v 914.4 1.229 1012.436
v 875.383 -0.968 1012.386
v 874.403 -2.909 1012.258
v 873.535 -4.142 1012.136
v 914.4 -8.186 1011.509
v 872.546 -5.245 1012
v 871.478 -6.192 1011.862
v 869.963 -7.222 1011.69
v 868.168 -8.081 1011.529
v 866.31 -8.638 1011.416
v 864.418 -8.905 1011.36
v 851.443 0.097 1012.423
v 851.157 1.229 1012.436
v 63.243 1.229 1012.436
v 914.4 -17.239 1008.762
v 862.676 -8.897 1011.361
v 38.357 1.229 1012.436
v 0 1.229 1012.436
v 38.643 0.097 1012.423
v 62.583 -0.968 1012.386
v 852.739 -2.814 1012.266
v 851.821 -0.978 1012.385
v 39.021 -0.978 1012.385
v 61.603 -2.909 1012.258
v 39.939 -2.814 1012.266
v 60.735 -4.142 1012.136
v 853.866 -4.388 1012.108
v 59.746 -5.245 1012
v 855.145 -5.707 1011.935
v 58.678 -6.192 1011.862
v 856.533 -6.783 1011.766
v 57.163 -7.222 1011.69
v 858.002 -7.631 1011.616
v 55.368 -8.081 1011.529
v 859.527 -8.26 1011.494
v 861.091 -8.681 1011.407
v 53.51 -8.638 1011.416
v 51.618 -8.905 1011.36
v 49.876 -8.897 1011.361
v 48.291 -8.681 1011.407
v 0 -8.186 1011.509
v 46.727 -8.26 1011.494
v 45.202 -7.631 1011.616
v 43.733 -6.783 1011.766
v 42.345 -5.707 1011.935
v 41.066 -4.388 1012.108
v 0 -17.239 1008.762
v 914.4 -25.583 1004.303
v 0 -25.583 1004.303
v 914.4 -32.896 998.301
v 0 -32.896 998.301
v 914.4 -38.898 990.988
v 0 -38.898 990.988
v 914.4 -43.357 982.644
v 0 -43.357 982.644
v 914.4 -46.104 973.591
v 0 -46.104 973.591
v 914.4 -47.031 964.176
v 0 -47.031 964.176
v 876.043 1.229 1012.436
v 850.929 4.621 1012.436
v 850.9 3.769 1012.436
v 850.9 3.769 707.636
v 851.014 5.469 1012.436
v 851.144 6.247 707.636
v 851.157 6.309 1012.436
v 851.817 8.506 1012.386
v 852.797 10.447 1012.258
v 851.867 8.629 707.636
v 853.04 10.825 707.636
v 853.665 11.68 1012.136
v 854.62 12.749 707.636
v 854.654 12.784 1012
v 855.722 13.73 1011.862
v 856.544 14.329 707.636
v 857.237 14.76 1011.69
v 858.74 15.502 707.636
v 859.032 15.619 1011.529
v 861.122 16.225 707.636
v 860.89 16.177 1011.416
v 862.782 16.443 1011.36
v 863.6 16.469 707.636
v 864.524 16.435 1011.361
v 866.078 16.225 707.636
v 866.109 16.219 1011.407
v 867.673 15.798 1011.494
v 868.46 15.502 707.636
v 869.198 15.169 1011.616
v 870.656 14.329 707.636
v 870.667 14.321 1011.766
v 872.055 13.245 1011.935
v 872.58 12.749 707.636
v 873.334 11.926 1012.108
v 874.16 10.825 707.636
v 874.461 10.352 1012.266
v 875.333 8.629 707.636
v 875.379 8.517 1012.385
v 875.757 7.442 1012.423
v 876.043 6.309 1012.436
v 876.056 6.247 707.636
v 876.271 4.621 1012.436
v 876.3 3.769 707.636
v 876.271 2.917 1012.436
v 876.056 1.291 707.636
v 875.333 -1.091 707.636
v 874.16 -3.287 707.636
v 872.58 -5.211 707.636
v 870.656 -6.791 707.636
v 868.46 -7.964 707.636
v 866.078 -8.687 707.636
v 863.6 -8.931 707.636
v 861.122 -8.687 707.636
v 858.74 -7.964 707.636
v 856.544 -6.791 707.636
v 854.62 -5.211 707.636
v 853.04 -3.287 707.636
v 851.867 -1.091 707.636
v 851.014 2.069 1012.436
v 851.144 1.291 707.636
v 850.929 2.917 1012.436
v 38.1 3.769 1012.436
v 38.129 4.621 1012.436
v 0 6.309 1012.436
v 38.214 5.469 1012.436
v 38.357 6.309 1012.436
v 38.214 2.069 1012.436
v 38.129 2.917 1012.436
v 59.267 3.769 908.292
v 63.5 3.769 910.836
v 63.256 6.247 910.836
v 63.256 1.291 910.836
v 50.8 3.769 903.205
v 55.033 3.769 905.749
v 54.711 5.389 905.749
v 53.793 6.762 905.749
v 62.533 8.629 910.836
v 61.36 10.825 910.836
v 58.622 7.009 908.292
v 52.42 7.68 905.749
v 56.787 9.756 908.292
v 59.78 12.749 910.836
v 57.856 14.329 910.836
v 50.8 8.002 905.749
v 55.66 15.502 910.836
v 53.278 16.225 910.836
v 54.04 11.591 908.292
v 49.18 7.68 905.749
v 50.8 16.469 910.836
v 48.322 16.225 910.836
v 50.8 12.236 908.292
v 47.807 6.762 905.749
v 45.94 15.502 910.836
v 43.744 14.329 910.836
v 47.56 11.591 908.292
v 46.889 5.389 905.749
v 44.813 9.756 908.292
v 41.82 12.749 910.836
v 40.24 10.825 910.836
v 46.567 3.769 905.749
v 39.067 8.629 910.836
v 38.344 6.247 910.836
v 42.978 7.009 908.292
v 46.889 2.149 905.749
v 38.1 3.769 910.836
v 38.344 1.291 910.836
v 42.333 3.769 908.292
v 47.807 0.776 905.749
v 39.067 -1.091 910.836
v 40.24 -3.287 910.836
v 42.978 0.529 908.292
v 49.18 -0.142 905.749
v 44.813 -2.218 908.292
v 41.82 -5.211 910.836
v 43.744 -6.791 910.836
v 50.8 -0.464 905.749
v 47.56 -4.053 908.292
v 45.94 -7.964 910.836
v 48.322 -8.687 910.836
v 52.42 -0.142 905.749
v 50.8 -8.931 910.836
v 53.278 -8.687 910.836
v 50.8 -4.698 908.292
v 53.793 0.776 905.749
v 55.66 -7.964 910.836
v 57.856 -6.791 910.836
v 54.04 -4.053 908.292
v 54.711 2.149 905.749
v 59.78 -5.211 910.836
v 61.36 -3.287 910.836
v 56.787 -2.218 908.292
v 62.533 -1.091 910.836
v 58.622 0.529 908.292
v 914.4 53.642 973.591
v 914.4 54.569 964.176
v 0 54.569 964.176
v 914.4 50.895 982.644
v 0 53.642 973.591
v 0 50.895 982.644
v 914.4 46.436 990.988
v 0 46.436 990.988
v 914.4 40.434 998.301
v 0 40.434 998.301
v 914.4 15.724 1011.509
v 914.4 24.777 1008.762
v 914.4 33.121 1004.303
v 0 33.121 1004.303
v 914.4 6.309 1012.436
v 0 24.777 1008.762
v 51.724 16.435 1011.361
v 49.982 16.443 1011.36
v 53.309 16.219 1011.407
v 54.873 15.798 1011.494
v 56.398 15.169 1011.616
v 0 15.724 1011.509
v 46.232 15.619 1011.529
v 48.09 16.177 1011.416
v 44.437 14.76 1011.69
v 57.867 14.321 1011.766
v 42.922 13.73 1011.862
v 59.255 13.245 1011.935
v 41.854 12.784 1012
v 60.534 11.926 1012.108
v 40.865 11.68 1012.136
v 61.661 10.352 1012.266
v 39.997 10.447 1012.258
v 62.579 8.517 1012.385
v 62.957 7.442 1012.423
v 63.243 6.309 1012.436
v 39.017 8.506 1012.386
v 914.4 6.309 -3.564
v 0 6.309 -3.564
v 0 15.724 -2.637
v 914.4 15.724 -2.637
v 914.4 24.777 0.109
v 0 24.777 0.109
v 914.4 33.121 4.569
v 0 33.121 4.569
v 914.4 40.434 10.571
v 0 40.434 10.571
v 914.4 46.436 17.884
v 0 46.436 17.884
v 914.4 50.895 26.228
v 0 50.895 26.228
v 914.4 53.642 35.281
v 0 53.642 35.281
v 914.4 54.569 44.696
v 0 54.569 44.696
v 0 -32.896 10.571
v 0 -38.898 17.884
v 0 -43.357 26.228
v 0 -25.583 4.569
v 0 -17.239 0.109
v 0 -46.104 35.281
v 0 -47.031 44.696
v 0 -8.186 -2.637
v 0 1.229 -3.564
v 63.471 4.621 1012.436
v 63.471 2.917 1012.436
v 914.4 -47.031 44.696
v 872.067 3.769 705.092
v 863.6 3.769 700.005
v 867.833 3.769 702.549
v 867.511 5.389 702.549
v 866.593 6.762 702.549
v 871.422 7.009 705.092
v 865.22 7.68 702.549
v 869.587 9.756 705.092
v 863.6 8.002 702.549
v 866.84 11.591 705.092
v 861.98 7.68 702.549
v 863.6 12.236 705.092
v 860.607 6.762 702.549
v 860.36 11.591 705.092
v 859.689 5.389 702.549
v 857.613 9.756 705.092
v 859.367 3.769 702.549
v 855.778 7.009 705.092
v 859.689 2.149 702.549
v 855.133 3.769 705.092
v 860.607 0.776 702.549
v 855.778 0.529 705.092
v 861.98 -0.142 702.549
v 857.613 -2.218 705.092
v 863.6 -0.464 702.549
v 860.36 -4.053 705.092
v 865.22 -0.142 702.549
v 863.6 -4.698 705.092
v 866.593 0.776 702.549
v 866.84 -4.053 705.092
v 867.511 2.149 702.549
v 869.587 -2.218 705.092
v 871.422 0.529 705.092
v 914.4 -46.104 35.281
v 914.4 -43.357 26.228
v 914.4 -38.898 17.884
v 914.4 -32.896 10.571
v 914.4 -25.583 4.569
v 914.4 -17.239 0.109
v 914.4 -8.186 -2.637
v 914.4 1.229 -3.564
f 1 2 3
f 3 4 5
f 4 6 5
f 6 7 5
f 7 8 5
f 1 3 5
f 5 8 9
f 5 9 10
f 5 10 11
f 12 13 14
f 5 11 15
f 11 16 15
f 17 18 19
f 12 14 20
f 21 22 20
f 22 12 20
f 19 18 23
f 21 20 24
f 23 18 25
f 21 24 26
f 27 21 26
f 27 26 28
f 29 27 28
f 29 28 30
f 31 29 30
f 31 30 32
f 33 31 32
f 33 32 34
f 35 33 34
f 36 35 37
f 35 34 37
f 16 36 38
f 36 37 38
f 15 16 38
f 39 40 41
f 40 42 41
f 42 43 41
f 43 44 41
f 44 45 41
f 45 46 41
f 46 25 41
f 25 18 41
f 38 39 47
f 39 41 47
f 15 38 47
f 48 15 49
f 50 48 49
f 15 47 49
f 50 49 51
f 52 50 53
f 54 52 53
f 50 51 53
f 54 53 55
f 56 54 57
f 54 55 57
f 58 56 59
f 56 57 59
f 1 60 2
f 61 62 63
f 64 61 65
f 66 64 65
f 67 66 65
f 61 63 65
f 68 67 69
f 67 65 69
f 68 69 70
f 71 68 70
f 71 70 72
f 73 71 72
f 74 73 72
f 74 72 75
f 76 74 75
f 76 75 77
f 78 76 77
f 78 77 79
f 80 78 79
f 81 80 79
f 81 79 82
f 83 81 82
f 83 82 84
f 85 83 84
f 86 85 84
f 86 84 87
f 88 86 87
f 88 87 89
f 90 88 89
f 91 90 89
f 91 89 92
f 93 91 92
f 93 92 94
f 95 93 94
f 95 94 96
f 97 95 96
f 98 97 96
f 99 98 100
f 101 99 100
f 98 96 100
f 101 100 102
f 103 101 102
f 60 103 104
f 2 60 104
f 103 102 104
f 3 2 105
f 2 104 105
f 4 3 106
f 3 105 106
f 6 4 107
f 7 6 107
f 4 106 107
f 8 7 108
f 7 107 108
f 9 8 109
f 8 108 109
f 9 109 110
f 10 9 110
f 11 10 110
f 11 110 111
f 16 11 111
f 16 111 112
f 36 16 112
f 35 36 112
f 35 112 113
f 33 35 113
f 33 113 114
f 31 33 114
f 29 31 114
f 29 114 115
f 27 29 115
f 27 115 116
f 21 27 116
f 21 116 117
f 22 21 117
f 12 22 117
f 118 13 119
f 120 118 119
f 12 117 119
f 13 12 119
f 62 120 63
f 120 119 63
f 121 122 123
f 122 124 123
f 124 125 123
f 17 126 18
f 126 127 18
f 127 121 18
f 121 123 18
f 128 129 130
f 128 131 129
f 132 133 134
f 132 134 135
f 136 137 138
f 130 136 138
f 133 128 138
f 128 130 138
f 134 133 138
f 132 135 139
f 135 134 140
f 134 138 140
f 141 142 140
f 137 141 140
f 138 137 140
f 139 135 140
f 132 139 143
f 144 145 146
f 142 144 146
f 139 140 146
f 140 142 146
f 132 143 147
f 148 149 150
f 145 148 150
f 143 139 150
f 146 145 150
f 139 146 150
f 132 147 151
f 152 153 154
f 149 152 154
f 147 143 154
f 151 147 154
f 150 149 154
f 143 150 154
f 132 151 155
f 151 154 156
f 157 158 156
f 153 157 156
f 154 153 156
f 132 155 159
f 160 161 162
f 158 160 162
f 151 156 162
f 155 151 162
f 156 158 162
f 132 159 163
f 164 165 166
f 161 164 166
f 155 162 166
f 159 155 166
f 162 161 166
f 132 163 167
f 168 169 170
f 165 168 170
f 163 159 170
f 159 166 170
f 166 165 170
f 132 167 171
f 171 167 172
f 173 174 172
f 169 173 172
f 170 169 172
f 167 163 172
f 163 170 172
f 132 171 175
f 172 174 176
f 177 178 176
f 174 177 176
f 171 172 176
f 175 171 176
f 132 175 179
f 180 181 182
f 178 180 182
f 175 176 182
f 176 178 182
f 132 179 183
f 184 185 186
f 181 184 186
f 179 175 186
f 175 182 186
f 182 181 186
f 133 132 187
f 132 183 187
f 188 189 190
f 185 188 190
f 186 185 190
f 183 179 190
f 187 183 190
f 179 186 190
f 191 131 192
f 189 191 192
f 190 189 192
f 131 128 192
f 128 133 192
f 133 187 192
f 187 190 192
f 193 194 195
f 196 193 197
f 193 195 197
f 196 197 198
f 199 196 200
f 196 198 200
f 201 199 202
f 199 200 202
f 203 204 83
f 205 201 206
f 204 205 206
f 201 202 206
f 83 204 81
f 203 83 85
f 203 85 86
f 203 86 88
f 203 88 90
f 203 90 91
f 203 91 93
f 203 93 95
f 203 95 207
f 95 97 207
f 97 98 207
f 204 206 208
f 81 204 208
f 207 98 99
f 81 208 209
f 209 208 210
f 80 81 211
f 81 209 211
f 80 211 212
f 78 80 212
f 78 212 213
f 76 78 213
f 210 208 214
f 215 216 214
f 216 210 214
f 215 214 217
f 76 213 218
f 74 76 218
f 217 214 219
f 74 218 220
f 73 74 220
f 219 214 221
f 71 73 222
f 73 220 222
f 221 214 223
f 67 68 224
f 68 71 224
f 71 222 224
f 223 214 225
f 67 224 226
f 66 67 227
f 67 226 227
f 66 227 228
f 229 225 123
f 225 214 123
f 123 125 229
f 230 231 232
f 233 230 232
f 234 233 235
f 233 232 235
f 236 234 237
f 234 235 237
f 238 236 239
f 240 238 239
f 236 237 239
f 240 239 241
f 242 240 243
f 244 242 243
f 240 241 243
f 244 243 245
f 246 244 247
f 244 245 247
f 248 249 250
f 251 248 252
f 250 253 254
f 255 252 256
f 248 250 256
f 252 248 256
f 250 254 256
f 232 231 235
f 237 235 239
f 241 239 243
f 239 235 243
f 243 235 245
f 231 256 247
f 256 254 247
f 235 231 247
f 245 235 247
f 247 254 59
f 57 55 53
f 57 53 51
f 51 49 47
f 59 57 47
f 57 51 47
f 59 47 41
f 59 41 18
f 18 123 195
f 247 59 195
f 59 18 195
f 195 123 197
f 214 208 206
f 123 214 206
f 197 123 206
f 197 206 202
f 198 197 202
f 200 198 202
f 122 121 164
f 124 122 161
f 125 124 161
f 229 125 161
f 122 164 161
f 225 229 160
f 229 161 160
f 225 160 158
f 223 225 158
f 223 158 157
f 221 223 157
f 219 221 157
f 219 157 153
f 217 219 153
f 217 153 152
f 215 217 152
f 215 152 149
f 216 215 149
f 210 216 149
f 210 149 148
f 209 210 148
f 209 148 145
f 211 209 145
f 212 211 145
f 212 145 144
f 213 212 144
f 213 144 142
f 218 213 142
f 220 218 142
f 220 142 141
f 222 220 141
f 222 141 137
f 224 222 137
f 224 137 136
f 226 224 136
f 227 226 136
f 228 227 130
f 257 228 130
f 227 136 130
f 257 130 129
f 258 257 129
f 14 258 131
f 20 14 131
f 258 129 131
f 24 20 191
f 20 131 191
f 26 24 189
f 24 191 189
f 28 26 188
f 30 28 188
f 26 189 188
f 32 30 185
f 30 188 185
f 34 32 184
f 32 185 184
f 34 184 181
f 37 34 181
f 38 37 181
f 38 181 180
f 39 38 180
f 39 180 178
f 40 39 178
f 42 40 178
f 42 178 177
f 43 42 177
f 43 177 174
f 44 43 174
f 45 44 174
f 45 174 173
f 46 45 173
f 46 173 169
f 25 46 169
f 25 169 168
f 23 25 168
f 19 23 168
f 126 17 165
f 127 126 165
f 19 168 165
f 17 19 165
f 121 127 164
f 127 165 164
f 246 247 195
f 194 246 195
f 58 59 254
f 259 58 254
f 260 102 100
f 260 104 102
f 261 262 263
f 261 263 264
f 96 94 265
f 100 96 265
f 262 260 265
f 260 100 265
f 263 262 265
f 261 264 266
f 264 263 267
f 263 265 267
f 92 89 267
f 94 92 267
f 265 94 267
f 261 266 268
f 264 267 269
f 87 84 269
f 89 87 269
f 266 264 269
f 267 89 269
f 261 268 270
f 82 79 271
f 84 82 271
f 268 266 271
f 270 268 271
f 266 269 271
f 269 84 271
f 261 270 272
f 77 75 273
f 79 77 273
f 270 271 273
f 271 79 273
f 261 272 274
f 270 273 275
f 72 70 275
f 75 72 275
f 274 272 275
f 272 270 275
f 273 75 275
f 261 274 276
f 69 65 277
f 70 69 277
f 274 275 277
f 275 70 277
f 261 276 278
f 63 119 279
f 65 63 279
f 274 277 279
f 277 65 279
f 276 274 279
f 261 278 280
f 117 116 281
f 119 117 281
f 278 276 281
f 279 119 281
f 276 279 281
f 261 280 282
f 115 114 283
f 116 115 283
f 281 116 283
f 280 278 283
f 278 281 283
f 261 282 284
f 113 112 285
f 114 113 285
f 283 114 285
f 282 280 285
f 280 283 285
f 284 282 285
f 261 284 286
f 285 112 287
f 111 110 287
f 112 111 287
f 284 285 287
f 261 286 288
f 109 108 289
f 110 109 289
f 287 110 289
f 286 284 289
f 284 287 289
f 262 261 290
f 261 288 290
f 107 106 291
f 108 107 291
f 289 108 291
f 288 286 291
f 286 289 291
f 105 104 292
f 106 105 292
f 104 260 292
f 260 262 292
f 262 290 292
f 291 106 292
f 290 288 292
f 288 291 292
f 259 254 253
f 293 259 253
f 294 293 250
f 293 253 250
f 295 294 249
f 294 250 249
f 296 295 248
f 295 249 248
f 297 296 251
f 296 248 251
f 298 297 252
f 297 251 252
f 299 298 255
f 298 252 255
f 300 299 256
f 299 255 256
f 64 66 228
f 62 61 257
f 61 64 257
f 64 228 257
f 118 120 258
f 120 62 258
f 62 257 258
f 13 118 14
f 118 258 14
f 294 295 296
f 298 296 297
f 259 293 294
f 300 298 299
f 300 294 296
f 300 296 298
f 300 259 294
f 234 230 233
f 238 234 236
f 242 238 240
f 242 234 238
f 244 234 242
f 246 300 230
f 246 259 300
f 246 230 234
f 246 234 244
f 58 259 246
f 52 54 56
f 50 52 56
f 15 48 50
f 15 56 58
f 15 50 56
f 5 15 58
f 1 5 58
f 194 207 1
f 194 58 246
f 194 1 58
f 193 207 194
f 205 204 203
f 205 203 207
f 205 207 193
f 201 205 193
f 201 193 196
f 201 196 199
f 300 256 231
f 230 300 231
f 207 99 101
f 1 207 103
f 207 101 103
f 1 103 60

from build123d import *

# Parameters (mm, degrees)
F1_DEPTH = 914.4
F3_D     = 25.4
F3_DEPTH = 101.6
F3_TIP   = 7.6309298617
F4_D     = 25.4
F4_DEPTH = 304.8
F4_TIP   = 7.6309298617


with BuildPart() as f1:
    # F0 (on Right) → F1 (new body)
    with BuildSketch(Plane.YZ):
        with BuildLine():
            Line((6.3090295458, 1012.4358065891), (1.2290295458, 1012.4358065891))
            ThreePointArc((1.2290295458, 1012.4358065891), (-32.8959437143, 998.3007798492), (-47.0309704542, 964.1758065891))
            Line((-47.0309704542, 964.1758065891), (-47.0309704542, 44.6958065891))
            ThreePointArc((-47.0309704542, 44.6958065891), (-32.8959437143, 10.5708333291), (1.2290295458, -3.5641934109))
            Line((1.2290295458, -3.5641934109), (6.3090295458, -3.5641934109))
            ThreePointArc((6.3090295458, -3.5641934109), (40.4340028058, 10.5708333291), (54.5690295458, 44.6958065891))
            Line((54.5690295458, 44.6958065891), (54.5690295458, 964.1758065891))
            ThreePointArc((54.5690295458, 964.1758065891), (40.4340028058, 998.3007798492), (6.3090295458, 1012.4358065891))
        make_face()
    extrude(amount=F1_DEPTH)

    # F3
    with Locations(Plane.XY.offset(1012.4358065891)):
        with Locations((50.8, 3.7690295458)):
            Hole(F3_D / 2, depth=F3_DEPTH)
            with Locations((0, 0, -(F3_DEPTH + F3_TIP / 2))):  # 118° drill point
                Cone(0, F3_D / 2, F3_TIP, mode=Mode.SUBTRACT)

    # F4
    with Locations(Plane.XY.offset(1012.4358065891)):
        with Locations((863.6, 3.7690295458)):
            Hole(F4_D / 2, depth=F4_DEPTH)
            with Locations((0, 0, -(F4_DEPTH + F4_TIP / 2))):  # 118° drill point
                Cone(0, F4_D / 2, F4_TIP, mode=Mode.SUBTRACT)


solid = f1.part
